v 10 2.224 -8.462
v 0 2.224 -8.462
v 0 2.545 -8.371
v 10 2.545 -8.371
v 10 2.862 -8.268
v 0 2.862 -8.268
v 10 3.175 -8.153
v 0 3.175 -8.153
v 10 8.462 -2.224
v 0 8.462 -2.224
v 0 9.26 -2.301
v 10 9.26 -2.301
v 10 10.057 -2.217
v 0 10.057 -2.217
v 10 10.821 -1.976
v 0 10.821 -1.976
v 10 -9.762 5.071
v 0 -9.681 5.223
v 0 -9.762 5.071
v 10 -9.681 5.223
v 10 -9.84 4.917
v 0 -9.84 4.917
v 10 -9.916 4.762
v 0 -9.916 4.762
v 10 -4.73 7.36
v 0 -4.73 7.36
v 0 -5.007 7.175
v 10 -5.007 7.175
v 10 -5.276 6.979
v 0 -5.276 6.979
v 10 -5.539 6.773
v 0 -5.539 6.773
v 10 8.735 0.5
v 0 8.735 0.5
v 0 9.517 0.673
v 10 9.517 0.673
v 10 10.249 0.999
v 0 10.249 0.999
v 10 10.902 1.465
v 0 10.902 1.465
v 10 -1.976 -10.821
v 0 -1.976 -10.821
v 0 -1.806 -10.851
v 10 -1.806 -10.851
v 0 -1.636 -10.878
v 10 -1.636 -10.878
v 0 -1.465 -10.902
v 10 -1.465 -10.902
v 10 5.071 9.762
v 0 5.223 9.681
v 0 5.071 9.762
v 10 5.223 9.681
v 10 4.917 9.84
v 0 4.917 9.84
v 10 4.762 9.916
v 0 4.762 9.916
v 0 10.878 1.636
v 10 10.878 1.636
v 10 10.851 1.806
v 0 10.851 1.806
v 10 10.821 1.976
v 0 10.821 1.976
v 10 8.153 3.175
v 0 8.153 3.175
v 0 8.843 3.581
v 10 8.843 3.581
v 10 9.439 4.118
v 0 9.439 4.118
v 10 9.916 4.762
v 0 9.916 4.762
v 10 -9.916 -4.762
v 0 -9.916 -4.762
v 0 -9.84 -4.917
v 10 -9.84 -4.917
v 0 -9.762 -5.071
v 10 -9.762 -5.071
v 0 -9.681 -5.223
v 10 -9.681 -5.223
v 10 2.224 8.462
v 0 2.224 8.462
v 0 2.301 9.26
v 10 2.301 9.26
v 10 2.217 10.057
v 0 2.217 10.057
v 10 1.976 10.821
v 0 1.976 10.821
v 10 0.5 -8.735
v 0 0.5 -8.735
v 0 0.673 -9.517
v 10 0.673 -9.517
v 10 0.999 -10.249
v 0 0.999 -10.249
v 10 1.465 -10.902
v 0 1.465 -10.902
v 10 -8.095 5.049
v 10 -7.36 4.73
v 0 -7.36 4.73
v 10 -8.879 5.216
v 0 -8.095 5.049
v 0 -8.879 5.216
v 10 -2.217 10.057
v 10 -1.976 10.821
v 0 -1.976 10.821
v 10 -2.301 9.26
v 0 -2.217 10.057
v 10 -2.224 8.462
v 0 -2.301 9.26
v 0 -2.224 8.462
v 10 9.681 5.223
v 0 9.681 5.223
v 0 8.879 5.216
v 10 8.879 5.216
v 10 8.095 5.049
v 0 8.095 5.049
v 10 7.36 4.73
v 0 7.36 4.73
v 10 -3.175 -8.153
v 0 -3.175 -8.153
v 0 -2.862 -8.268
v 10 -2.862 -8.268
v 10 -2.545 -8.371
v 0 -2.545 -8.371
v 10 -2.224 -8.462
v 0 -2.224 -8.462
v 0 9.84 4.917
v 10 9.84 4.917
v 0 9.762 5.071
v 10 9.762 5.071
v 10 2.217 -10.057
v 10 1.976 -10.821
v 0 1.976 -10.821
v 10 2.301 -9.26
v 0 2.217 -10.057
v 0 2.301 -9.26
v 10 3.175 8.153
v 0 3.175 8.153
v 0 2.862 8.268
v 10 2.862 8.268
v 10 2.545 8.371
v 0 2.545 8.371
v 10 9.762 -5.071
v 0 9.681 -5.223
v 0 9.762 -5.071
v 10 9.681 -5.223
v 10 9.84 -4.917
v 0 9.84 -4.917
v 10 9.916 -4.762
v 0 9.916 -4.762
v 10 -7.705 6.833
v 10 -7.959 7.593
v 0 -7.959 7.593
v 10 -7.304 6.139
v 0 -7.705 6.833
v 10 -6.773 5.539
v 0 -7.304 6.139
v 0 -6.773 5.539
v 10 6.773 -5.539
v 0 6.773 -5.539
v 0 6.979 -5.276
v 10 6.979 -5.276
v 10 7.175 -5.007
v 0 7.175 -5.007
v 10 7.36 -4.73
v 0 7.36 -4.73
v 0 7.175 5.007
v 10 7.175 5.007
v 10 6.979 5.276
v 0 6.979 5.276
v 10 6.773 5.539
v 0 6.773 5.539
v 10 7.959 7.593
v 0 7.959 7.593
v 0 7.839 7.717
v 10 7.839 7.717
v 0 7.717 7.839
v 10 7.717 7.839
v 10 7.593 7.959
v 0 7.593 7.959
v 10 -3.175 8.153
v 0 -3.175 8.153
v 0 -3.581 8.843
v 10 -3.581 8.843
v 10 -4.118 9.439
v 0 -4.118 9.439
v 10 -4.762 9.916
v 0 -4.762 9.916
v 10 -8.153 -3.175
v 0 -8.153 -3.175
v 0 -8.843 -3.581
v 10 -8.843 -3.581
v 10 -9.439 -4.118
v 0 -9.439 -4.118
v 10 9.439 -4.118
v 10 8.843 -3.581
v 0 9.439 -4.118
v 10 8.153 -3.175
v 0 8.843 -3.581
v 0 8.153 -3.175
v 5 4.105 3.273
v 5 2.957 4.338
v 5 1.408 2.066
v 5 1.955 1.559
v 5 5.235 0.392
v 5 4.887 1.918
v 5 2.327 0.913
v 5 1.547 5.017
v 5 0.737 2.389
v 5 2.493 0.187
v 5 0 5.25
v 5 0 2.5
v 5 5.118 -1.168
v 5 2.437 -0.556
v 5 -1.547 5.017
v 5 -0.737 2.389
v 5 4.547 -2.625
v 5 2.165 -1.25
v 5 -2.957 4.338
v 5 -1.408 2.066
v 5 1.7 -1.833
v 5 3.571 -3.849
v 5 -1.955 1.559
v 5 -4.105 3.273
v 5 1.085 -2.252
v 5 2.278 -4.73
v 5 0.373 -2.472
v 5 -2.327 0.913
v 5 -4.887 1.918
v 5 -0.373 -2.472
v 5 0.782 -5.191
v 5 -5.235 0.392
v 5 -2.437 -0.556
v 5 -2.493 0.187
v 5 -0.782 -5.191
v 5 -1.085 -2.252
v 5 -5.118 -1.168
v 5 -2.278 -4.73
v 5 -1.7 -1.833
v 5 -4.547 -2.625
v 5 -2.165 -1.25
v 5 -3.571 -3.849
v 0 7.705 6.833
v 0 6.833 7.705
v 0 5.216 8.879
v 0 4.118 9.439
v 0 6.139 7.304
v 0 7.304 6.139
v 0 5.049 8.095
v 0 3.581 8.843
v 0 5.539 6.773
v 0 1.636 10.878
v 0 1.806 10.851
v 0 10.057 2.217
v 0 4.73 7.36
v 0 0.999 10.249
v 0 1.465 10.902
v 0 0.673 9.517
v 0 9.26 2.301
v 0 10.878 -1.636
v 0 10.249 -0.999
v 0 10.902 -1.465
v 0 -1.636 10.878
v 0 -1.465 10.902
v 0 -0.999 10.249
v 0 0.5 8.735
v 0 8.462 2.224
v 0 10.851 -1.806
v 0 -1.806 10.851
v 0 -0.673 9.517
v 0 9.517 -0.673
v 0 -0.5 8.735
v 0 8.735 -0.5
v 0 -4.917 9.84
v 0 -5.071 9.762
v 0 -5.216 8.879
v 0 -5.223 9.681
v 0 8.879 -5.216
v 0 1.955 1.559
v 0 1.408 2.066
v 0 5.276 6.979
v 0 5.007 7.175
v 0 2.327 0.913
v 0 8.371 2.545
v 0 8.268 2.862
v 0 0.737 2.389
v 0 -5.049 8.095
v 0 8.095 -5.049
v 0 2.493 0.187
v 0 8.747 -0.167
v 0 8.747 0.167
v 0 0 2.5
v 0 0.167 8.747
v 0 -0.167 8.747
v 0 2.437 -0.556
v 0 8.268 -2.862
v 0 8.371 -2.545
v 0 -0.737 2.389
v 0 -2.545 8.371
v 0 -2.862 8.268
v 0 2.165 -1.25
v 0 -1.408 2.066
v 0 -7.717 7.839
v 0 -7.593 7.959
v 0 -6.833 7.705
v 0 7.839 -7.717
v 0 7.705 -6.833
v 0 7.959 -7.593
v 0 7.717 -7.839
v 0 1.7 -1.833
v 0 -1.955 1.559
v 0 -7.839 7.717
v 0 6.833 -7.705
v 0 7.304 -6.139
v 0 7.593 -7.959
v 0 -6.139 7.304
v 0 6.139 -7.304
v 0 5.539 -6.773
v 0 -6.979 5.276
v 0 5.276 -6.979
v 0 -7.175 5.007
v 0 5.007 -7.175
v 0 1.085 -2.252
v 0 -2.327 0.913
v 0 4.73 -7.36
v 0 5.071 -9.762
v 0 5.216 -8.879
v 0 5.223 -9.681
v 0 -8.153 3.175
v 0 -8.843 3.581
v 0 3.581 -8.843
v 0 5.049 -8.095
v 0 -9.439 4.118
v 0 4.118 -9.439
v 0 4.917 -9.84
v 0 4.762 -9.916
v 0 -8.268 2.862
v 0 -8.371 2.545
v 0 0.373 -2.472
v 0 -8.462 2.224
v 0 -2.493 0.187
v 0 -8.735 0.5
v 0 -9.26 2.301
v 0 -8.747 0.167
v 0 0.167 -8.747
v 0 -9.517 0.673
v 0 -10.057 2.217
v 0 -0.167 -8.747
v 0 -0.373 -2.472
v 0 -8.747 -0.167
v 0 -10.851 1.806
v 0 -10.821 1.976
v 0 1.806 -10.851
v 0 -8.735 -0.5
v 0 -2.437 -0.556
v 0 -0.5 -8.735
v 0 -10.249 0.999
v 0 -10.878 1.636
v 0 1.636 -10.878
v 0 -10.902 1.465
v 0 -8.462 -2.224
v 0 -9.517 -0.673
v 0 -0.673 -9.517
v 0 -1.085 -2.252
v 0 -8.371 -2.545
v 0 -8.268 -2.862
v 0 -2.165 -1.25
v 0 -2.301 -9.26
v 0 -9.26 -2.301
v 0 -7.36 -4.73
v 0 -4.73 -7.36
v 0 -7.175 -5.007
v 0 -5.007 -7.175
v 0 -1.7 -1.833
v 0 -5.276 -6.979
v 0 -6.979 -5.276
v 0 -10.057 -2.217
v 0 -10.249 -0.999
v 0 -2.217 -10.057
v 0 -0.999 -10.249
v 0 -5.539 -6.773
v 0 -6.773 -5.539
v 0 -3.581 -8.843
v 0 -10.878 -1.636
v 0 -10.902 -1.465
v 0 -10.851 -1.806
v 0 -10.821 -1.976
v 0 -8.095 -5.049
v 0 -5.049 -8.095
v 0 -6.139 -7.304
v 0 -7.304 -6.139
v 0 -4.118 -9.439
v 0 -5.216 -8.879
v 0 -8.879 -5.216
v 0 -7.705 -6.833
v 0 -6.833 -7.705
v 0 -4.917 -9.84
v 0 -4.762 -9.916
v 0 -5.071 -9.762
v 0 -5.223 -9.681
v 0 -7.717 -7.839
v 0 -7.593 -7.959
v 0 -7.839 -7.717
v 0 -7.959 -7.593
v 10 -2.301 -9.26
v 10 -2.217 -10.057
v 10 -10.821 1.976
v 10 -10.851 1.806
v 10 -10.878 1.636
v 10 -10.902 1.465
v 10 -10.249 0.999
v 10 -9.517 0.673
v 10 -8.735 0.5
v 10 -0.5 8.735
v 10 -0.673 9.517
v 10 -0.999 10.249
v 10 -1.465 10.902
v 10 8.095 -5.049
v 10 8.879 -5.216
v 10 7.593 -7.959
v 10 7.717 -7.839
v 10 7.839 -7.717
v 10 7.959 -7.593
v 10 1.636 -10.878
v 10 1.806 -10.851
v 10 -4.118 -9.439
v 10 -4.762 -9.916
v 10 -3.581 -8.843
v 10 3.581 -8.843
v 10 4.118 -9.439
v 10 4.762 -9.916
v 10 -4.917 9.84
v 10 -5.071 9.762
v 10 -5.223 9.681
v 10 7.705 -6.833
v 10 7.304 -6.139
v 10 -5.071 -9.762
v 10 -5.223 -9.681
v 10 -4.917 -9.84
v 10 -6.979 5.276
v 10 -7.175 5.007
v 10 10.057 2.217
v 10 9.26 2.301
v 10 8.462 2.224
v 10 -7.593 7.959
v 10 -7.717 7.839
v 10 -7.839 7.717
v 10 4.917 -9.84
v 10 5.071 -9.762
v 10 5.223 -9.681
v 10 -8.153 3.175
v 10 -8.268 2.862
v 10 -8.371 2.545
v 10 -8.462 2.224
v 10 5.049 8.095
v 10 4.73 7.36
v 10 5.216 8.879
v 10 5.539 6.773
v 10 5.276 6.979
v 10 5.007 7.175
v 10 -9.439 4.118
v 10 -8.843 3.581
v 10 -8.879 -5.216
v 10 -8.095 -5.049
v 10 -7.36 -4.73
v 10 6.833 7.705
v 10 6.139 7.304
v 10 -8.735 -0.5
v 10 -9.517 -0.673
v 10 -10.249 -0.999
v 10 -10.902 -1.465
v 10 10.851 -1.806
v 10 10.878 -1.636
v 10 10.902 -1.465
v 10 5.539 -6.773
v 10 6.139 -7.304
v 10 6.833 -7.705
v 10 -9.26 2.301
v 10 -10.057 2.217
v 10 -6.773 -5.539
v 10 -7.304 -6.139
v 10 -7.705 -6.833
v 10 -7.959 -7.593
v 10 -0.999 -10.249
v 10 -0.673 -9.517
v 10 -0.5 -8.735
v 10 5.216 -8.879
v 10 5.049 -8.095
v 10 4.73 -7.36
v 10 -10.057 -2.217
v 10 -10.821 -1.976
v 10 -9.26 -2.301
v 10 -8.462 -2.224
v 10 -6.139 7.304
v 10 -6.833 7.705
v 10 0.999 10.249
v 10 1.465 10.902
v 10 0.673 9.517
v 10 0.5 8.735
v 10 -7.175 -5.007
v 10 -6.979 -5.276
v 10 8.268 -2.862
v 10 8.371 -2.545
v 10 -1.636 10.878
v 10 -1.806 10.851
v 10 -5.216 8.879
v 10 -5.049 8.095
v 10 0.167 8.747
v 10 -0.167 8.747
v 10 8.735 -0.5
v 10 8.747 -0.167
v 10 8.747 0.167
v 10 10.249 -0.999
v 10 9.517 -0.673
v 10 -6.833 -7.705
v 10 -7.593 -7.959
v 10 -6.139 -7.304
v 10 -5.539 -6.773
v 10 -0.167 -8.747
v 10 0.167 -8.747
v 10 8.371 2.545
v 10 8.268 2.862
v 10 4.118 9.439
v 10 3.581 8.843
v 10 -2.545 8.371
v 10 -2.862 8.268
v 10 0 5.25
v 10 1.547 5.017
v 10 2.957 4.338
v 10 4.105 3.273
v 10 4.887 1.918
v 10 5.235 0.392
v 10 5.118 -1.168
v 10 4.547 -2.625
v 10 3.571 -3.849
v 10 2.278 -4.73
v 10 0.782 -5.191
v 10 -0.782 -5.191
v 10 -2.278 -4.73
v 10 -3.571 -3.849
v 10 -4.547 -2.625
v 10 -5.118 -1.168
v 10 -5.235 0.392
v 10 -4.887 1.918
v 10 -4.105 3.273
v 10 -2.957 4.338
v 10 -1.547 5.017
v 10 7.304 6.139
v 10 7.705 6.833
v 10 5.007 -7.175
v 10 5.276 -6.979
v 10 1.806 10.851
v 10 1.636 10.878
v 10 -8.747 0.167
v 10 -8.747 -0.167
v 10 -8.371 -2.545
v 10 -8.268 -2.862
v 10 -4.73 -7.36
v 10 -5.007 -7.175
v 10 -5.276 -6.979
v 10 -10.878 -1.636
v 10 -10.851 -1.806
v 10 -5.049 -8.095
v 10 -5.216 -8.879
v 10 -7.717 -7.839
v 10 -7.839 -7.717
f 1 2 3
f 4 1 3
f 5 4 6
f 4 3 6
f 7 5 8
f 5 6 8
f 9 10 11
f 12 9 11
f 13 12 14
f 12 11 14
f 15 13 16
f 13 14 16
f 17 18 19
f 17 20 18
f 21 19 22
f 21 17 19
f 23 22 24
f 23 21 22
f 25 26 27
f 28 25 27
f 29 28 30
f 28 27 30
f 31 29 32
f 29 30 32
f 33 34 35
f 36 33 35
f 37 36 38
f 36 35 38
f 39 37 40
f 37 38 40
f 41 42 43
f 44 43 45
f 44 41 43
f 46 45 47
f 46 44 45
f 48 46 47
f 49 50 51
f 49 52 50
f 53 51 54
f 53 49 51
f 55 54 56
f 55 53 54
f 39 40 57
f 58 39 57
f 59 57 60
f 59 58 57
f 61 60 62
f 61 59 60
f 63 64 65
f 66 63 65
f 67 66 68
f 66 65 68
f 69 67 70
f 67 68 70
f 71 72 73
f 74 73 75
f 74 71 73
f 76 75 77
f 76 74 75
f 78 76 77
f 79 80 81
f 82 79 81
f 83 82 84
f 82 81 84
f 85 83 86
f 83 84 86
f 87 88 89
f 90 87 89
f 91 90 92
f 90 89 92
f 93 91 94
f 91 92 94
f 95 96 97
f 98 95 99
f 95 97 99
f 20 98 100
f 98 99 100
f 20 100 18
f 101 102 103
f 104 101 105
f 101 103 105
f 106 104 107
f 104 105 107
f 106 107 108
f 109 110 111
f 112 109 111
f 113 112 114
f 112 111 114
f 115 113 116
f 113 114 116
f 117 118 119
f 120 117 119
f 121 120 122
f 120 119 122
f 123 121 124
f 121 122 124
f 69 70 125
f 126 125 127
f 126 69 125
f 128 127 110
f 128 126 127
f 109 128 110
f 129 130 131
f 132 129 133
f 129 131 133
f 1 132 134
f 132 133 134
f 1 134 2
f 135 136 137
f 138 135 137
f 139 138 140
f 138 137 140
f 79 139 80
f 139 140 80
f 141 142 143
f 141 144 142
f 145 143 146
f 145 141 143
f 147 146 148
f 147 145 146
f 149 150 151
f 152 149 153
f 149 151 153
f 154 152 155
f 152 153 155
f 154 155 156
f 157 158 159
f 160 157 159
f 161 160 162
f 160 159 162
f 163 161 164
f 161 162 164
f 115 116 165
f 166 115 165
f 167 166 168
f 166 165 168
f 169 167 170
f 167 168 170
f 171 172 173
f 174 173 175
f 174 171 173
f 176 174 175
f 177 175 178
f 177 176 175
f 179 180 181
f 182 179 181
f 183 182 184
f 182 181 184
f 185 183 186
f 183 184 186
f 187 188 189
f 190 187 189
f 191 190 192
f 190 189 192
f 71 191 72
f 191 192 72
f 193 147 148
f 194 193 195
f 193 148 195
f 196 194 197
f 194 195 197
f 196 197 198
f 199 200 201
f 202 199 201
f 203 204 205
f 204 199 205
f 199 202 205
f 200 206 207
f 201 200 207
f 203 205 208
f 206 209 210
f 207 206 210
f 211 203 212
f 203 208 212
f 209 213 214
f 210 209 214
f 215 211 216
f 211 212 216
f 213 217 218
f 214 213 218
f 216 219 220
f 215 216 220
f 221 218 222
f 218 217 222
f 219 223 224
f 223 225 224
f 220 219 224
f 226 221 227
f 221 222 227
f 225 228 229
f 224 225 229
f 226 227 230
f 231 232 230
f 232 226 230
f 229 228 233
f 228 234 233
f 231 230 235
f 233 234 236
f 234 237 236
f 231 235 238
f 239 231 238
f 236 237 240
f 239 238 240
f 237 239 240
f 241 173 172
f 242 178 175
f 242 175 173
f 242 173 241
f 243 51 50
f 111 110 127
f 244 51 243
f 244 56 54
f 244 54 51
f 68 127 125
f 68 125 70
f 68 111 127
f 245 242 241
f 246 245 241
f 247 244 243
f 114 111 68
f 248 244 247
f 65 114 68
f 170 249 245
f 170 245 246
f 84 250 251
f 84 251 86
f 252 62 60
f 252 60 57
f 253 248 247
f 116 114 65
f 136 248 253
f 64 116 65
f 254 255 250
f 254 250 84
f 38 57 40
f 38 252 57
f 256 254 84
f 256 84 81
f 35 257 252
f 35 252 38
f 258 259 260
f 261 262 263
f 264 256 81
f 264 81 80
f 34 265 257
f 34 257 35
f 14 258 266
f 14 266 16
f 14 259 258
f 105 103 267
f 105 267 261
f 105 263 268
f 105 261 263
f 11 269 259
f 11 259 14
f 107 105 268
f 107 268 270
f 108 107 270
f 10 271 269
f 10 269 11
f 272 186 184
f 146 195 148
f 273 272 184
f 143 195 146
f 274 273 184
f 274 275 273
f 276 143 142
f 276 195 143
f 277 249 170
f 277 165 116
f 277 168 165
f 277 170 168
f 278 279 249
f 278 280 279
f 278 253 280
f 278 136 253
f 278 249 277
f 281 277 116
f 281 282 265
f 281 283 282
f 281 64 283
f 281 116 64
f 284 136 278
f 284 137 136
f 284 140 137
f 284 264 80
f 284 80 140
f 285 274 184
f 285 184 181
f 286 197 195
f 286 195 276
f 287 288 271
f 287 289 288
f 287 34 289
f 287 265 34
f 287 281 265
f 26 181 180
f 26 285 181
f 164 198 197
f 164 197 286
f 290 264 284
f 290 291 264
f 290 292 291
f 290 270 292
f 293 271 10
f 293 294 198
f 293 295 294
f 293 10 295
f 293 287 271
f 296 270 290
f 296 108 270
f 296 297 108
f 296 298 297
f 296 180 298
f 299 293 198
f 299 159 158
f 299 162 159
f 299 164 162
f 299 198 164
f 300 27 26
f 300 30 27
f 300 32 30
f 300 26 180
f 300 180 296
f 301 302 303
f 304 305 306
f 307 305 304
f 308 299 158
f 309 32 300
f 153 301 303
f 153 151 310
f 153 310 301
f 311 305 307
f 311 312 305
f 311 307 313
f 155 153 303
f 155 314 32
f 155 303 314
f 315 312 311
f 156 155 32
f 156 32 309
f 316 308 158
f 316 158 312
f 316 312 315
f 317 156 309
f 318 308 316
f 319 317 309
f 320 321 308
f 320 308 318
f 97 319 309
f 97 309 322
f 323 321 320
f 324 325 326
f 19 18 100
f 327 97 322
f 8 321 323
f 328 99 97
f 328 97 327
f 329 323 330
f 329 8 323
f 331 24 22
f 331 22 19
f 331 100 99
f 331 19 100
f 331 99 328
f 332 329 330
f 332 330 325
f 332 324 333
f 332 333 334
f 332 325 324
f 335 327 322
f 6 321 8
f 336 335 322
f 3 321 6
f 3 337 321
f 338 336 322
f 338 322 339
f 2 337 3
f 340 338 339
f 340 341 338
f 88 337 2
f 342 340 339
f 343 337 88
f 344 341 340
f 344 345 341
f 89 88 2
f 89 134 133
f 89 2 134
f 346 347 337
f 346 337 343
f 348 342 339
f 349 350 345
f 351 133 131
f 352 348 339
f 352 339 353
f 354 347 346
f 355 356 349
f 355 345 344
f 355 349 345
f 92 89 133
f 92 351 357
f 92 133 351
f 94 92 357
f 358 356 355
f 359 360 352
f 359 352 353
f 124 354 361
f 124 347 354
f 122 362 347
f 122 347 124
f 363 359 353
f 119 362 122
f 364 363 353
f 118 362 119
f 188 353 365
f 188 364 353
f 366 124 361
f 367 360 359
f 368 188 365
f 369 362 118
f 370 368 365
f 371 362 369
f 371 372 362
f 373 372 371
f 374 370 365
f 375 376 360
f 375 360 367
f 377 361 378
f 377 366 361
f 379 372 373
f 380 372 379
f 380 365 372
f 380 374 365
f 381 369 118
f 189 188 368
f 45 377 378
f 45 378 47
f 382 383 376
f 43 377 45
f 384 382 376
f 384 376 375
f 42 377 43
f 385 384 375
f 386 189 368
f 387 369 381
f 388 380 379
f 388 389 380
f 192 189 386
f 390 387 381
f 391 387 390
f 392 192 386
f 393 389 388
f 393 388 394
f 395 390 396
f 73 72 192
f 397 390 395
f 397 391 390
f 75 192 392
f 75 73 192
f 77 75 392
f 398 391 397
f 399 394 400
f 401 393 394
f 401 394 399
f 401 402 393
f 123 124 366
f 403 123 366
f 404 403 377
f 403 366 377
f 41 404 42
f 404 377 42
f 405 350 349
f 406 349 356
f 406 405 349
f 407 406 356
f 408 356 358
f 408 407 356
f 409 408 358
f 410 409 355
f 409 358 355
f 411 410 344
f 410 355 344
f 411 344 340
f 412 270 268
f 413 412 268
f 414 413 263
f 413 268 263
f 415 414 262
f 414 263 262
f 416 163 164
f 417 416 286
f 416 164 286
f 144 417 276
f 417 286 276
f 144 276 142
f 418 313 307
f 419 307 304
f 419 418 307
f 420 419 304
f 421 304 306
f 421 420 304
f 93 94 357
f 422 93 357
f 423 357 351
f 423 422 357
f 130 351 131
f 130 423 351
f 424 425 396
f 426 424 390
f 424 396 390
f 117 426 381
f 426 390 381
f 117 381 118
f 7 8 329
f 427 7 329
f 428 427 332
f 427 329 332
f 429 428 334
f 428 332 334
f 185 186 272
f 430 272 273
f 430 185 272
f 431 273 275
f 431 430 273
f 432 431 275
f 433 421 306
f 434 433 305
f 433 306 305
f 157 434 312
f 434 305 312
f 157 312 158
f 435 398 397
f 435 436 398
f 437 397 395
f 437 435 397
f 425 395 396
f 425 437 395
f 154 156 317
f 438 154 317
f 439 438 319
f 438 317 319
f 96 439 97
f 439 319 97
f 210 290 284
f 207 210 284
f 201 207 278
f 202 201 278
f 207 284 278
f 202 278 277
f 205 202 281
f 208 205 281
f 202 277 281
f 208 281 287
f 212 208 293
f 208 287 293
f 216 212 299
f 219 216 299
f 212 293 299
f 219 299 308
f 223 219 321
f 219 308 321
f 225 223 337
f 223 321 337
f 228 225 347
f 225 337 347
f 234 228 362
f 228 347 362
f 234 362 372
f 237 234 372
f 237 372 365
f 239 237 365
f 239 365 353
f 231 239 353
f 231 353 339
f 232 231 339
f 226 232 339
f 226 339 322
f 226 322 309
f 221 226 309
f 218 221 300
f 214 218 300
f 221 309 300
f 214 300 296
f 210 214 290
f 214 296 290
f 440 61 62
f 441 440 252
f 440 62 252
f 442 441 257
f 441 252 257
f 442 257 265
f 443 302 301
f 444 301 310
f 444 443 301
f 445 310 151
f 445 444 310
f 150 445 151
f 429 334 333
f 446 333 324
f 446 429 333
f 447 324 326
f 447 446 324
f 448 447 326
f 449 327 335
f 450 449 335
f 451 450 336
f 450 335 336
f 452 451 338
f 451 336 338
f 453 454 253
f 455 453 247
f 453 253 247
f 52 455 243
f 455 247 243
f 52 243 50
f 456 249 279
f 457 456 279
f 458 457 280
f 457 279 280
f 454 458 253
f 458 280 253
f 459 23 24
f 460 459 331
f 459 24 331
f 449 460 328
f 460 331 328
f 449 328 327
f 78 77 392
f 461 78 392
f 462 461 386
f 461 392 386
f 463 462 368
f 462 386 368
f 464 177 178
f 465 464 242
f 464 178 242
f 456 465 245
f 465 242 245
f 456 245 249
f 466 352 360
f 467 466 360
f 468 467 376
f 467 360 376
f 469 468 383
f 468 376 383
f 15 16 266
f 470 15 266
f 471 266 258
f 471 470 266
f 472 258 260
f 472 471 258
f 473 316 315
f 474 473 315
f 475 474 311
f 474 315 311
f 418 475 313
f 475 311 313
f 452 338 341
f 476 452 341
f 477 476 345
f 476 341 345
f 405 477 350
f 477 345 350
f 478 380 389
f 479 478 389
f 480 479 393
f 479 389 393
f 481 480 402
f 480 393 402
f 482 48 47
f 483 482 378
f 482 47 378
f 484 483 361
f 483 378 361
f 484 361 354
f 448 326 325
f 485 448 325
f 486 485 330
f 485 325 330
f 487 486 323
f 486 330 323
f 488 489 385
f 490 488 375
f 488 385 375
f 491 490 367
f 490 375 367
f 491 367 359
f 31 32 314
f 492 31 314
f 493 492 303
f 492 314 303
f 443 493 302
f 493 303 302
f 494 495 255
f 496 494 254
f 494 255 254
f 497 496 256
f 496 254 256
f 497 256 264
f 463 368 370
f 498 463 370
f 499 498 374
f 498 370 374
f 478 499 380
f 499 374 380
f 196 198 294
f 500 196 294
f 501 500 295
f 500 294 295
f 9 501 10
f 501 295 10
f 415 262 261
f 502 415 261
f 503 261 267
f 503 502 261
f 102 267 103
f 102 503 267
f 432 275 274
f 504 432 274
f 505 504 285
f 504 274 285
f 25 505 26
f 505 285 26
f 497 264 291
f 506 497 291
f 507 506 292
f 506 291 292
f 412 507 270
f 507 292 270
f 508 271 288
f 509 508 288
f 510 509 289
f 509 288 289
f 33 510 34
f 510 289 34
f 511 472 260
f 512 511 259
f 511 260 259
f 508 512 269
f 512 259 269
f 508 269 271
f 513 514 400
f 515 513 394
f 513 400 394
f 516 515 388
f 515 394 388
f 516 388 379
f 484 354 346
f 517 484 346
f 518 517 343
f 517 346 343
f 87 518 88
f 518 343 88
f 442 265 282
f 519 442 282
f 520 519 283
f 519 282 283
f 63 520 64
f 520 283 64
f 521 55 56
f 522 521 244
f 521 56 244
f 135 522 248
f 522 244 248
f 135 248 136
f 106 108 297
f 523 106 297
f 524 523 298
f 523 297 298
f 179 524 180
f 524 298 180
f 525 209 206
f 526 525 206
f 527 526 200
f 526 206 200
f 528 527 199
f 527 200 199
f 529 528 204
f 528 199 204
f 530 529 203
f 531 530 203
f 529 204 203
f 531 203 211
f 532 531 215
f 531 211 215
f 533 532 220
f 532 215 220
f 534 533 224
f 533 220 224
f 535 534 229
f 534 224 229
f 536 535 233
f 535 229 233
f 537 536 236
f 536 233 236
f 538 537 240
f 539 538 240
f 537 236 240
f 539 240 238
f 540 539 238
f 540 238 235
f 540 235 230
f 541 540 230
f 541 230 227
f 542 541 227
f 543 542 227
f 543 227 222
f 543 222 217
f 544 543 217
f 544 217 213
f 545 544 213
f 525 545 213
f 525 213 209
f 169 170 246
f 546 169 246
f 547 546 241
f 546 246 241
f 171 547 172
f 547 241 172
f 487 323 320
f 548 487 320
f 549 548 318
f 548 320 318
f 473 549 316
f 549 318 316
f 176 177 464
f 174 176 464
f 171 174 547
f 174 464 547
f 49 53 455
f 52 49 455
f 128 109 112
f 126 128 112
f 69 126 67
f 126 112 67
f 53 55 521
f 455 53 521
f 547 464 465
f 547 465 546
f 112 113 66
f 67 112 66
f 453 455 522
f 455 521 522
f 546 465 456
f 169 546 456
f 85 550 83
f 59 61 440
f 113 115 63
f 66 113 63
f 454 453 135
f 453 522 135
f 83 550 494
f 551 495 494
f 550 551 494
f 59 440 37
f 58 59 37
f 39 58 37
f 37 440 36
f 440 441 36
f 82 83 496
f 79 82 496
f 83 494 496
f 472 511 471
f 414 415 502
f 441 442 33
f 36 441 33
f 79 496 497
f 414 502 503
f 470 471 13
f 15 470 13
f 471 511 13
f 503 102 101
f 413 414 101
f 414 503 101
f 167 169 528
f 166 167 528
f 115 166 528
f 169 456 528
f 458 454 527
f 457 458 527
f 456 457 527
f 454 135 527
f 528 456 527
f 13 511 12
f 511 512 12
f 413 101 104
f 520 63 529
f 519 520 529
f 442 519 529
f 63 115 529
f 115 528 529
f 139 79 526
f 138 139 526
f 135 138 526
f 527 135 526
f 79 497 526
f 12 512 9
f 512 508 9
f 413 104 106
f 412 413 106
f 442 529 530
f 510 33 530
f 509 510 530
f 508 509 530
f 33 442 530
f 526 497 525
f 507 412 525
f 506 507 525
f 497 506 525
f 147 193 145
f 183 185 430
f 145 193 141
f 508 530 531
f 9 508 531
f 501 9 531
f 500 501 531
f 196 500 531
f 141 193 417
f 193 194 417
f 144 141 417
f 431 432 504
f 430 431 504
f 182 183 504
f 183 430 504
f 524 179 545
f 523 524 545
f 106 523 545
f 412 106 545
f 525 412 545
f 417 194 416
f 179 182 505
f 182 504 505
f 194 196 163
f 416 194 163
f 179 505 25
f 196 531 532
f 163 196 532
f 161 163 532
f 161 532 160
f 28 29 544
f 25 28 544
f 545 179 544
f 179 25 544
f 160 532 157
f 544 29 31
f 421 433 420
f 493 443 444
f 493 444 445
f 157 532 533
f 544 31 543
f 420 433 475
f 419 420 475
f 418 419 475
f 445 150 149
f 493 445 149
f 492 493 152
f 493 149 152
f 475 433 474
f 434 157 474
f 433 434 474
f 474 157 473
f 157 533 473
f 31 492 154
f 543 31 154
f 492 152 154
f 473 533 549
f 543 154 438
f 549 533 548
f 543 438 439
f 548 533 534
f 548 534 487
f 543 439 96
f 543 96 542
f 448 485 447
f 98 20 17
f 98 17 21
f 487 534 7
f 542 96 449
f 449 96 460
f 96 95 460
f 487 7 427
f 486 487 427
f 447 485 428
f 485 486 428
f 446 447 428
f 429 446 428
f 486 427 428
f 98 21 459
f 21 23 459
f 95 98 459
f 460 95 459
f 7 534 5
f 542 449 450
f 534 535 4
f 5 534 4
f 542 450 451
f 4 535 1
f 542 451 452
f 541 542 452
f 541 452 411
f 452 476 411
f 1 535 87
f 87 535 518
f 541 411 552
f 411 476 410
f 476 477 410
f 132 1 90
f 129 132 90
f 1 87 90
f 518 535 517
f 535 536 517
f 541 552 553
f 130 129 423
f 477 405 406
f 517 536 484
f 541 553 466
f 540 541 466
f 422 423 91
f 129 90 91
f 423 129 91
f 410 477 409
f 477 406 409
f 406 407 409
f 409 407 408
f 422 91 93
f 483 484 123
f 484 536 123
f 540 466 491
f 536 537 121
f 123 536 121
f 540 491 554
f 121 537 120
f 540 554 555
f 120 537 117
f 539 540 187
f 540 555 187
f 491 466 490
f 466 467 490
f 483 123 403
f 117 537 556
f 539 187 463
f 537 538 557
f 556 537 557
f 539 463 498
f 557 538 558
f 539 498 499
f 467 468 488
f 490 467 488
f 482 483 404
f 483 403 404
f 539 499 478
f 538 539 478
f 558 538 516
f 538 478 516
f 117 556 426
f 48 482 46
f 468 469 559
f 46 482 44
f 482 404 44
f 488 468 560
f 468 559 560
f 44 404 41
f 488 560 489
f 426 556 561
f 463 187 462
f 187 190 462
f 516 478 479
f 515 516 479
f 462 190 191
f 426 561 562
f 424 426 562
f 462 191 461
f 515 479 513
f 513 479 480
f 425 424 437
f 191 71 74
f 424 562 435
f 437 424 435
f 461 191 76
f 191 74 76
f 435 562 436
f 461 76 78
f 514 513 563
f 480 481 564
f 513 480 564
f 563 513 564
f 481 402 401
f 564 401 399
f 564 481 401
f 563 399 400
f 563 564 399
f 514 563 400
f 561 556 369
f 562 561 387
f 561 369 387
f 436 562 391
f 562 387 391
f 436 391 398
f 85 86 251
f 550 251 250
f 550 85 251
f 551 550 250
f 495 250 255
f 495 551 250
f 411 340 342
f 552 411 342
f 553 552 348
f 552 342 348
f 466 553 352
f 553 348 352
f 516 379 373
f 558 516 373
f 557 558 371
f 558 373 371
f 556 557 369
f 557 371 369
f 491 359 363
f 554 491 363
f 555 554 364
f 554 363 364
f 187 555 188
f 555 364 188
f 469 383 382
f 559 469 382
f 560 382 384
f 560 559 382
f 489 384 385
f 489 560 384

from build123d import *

# Parameters (mm, degrees)
BASPROSKE_W                   = 10
BASPROSKE_H                   = 11
TOOTHCUT_DEPTH                = 19.493242009
TEETHCUTS_COUNT               = 20
TEETHCUTS_ANGLE               = 342
BORSKE_R                      = 0.4
BORE_DEPTH                    = 50.0000508
TALADRO_DE_MARGEN_PARA_M101_D = 10.5
CROQUIS3_R                    = 5.25
CROQUIS3_R_2                  = 2.5
SALIENTE_EXTRUIR1_DEPTH       = 5


with BuildPart() as part:
    # BasProSke → Base-Revolve (revolve)
    with BuildSketch(Plane(origin=(0, 0, 0), x_dir=(1, 0, 0), z_dir=(0, 1, 0)), mode=Mode.PRIVATE) as base_revolve_sk:
        with Locations((5, 5.5)):
            Rectangle(BASPROSKE_W, BASPROSKE_H)
    revolve(base_revolve_sk.sketch.rotate(Axis((-10, 0, 0), (1, 0, 0)), 180), axis=Axis((-10, 0, 0), (1, 0, 0)))

    # TooCutSke → ToothCut (cut, through all)
    with BuildSketch(Plane(origin=(0, 0, 0), x_dir=(0, 0, -1), z_dir=(1, 0, 0))):
        with BuildLine():
            ThreePointArc((0.499924007, 8.734705318), (0, 8.749), (-0.499924007, 8.734705318))
            ThreePointArc((-0.499924007, 8.734705318), (-0.824302243, 9.905497836), (-1.485192705, 10.924909509))
            ThreePointArc((-1.485192705, 10.924909509), (0, 11.0254), (1.485192705, 10.924909509))
            ThreePointArc((1.485192705, 10.924909509), (0.824302243, 9.905497836), (0.499924007, 8.734705318))
        make_face()
    toothcut = extrude(amount=TOOTHCUT_DEPTH, mode=Mode.SUBTRACT)

    # TeethCuts: ToothCut ×20 about axis
    teethcuts_axis = Axis((-10, 0, 0), (1, 0, 0))
    for i in range(1, TEETHCUTS_COUNT):
        add(toothcut.rotate(teethcuts_axis, i * TEETHCUTS_ANGLE / (TEETHCUTS_COUNT - 1)), mode=Mode.SUBTRACT)

    # BorSke → Bore (cut, symmetric)
    with BuildSketch(Plane(origin=(0, 0, 0), x_dir=(0, 0, -1), z_dir=(1, 0, 0))):
        with Locations(Location((0, 0, 0), (0, 0, 180))):
            Circle(BORSKE_R)
    extrude(amount=BORE_DEPTH, both=True, mode=Mode.SUBTRACT)

    # Taladro de margen para M101 (through all)
    with Locations(Plane(origin=(10, 0, 0), x_dir=(0, 0, -1), z_dir=(1, 0, 0))):
        with Locations((0, 0)):
            Hole(TALADRO_DE_MARGEN_PARA_M101_D / 2)

    # Croquis3 → Saliente-Extruir1 (add)
    with BuildSketch(Plane.ZY):
        with Locations(Location((0, 0, 0), (0, 0, 180))):
            Circle(CROQUIS3_R)
        Circle(CROQUIS3_R_2, mode=Mode.SUBTRACT)
    extrude(amount=-SALIENTE_EXTRUIR1_DEPTH)


solid = part.part
